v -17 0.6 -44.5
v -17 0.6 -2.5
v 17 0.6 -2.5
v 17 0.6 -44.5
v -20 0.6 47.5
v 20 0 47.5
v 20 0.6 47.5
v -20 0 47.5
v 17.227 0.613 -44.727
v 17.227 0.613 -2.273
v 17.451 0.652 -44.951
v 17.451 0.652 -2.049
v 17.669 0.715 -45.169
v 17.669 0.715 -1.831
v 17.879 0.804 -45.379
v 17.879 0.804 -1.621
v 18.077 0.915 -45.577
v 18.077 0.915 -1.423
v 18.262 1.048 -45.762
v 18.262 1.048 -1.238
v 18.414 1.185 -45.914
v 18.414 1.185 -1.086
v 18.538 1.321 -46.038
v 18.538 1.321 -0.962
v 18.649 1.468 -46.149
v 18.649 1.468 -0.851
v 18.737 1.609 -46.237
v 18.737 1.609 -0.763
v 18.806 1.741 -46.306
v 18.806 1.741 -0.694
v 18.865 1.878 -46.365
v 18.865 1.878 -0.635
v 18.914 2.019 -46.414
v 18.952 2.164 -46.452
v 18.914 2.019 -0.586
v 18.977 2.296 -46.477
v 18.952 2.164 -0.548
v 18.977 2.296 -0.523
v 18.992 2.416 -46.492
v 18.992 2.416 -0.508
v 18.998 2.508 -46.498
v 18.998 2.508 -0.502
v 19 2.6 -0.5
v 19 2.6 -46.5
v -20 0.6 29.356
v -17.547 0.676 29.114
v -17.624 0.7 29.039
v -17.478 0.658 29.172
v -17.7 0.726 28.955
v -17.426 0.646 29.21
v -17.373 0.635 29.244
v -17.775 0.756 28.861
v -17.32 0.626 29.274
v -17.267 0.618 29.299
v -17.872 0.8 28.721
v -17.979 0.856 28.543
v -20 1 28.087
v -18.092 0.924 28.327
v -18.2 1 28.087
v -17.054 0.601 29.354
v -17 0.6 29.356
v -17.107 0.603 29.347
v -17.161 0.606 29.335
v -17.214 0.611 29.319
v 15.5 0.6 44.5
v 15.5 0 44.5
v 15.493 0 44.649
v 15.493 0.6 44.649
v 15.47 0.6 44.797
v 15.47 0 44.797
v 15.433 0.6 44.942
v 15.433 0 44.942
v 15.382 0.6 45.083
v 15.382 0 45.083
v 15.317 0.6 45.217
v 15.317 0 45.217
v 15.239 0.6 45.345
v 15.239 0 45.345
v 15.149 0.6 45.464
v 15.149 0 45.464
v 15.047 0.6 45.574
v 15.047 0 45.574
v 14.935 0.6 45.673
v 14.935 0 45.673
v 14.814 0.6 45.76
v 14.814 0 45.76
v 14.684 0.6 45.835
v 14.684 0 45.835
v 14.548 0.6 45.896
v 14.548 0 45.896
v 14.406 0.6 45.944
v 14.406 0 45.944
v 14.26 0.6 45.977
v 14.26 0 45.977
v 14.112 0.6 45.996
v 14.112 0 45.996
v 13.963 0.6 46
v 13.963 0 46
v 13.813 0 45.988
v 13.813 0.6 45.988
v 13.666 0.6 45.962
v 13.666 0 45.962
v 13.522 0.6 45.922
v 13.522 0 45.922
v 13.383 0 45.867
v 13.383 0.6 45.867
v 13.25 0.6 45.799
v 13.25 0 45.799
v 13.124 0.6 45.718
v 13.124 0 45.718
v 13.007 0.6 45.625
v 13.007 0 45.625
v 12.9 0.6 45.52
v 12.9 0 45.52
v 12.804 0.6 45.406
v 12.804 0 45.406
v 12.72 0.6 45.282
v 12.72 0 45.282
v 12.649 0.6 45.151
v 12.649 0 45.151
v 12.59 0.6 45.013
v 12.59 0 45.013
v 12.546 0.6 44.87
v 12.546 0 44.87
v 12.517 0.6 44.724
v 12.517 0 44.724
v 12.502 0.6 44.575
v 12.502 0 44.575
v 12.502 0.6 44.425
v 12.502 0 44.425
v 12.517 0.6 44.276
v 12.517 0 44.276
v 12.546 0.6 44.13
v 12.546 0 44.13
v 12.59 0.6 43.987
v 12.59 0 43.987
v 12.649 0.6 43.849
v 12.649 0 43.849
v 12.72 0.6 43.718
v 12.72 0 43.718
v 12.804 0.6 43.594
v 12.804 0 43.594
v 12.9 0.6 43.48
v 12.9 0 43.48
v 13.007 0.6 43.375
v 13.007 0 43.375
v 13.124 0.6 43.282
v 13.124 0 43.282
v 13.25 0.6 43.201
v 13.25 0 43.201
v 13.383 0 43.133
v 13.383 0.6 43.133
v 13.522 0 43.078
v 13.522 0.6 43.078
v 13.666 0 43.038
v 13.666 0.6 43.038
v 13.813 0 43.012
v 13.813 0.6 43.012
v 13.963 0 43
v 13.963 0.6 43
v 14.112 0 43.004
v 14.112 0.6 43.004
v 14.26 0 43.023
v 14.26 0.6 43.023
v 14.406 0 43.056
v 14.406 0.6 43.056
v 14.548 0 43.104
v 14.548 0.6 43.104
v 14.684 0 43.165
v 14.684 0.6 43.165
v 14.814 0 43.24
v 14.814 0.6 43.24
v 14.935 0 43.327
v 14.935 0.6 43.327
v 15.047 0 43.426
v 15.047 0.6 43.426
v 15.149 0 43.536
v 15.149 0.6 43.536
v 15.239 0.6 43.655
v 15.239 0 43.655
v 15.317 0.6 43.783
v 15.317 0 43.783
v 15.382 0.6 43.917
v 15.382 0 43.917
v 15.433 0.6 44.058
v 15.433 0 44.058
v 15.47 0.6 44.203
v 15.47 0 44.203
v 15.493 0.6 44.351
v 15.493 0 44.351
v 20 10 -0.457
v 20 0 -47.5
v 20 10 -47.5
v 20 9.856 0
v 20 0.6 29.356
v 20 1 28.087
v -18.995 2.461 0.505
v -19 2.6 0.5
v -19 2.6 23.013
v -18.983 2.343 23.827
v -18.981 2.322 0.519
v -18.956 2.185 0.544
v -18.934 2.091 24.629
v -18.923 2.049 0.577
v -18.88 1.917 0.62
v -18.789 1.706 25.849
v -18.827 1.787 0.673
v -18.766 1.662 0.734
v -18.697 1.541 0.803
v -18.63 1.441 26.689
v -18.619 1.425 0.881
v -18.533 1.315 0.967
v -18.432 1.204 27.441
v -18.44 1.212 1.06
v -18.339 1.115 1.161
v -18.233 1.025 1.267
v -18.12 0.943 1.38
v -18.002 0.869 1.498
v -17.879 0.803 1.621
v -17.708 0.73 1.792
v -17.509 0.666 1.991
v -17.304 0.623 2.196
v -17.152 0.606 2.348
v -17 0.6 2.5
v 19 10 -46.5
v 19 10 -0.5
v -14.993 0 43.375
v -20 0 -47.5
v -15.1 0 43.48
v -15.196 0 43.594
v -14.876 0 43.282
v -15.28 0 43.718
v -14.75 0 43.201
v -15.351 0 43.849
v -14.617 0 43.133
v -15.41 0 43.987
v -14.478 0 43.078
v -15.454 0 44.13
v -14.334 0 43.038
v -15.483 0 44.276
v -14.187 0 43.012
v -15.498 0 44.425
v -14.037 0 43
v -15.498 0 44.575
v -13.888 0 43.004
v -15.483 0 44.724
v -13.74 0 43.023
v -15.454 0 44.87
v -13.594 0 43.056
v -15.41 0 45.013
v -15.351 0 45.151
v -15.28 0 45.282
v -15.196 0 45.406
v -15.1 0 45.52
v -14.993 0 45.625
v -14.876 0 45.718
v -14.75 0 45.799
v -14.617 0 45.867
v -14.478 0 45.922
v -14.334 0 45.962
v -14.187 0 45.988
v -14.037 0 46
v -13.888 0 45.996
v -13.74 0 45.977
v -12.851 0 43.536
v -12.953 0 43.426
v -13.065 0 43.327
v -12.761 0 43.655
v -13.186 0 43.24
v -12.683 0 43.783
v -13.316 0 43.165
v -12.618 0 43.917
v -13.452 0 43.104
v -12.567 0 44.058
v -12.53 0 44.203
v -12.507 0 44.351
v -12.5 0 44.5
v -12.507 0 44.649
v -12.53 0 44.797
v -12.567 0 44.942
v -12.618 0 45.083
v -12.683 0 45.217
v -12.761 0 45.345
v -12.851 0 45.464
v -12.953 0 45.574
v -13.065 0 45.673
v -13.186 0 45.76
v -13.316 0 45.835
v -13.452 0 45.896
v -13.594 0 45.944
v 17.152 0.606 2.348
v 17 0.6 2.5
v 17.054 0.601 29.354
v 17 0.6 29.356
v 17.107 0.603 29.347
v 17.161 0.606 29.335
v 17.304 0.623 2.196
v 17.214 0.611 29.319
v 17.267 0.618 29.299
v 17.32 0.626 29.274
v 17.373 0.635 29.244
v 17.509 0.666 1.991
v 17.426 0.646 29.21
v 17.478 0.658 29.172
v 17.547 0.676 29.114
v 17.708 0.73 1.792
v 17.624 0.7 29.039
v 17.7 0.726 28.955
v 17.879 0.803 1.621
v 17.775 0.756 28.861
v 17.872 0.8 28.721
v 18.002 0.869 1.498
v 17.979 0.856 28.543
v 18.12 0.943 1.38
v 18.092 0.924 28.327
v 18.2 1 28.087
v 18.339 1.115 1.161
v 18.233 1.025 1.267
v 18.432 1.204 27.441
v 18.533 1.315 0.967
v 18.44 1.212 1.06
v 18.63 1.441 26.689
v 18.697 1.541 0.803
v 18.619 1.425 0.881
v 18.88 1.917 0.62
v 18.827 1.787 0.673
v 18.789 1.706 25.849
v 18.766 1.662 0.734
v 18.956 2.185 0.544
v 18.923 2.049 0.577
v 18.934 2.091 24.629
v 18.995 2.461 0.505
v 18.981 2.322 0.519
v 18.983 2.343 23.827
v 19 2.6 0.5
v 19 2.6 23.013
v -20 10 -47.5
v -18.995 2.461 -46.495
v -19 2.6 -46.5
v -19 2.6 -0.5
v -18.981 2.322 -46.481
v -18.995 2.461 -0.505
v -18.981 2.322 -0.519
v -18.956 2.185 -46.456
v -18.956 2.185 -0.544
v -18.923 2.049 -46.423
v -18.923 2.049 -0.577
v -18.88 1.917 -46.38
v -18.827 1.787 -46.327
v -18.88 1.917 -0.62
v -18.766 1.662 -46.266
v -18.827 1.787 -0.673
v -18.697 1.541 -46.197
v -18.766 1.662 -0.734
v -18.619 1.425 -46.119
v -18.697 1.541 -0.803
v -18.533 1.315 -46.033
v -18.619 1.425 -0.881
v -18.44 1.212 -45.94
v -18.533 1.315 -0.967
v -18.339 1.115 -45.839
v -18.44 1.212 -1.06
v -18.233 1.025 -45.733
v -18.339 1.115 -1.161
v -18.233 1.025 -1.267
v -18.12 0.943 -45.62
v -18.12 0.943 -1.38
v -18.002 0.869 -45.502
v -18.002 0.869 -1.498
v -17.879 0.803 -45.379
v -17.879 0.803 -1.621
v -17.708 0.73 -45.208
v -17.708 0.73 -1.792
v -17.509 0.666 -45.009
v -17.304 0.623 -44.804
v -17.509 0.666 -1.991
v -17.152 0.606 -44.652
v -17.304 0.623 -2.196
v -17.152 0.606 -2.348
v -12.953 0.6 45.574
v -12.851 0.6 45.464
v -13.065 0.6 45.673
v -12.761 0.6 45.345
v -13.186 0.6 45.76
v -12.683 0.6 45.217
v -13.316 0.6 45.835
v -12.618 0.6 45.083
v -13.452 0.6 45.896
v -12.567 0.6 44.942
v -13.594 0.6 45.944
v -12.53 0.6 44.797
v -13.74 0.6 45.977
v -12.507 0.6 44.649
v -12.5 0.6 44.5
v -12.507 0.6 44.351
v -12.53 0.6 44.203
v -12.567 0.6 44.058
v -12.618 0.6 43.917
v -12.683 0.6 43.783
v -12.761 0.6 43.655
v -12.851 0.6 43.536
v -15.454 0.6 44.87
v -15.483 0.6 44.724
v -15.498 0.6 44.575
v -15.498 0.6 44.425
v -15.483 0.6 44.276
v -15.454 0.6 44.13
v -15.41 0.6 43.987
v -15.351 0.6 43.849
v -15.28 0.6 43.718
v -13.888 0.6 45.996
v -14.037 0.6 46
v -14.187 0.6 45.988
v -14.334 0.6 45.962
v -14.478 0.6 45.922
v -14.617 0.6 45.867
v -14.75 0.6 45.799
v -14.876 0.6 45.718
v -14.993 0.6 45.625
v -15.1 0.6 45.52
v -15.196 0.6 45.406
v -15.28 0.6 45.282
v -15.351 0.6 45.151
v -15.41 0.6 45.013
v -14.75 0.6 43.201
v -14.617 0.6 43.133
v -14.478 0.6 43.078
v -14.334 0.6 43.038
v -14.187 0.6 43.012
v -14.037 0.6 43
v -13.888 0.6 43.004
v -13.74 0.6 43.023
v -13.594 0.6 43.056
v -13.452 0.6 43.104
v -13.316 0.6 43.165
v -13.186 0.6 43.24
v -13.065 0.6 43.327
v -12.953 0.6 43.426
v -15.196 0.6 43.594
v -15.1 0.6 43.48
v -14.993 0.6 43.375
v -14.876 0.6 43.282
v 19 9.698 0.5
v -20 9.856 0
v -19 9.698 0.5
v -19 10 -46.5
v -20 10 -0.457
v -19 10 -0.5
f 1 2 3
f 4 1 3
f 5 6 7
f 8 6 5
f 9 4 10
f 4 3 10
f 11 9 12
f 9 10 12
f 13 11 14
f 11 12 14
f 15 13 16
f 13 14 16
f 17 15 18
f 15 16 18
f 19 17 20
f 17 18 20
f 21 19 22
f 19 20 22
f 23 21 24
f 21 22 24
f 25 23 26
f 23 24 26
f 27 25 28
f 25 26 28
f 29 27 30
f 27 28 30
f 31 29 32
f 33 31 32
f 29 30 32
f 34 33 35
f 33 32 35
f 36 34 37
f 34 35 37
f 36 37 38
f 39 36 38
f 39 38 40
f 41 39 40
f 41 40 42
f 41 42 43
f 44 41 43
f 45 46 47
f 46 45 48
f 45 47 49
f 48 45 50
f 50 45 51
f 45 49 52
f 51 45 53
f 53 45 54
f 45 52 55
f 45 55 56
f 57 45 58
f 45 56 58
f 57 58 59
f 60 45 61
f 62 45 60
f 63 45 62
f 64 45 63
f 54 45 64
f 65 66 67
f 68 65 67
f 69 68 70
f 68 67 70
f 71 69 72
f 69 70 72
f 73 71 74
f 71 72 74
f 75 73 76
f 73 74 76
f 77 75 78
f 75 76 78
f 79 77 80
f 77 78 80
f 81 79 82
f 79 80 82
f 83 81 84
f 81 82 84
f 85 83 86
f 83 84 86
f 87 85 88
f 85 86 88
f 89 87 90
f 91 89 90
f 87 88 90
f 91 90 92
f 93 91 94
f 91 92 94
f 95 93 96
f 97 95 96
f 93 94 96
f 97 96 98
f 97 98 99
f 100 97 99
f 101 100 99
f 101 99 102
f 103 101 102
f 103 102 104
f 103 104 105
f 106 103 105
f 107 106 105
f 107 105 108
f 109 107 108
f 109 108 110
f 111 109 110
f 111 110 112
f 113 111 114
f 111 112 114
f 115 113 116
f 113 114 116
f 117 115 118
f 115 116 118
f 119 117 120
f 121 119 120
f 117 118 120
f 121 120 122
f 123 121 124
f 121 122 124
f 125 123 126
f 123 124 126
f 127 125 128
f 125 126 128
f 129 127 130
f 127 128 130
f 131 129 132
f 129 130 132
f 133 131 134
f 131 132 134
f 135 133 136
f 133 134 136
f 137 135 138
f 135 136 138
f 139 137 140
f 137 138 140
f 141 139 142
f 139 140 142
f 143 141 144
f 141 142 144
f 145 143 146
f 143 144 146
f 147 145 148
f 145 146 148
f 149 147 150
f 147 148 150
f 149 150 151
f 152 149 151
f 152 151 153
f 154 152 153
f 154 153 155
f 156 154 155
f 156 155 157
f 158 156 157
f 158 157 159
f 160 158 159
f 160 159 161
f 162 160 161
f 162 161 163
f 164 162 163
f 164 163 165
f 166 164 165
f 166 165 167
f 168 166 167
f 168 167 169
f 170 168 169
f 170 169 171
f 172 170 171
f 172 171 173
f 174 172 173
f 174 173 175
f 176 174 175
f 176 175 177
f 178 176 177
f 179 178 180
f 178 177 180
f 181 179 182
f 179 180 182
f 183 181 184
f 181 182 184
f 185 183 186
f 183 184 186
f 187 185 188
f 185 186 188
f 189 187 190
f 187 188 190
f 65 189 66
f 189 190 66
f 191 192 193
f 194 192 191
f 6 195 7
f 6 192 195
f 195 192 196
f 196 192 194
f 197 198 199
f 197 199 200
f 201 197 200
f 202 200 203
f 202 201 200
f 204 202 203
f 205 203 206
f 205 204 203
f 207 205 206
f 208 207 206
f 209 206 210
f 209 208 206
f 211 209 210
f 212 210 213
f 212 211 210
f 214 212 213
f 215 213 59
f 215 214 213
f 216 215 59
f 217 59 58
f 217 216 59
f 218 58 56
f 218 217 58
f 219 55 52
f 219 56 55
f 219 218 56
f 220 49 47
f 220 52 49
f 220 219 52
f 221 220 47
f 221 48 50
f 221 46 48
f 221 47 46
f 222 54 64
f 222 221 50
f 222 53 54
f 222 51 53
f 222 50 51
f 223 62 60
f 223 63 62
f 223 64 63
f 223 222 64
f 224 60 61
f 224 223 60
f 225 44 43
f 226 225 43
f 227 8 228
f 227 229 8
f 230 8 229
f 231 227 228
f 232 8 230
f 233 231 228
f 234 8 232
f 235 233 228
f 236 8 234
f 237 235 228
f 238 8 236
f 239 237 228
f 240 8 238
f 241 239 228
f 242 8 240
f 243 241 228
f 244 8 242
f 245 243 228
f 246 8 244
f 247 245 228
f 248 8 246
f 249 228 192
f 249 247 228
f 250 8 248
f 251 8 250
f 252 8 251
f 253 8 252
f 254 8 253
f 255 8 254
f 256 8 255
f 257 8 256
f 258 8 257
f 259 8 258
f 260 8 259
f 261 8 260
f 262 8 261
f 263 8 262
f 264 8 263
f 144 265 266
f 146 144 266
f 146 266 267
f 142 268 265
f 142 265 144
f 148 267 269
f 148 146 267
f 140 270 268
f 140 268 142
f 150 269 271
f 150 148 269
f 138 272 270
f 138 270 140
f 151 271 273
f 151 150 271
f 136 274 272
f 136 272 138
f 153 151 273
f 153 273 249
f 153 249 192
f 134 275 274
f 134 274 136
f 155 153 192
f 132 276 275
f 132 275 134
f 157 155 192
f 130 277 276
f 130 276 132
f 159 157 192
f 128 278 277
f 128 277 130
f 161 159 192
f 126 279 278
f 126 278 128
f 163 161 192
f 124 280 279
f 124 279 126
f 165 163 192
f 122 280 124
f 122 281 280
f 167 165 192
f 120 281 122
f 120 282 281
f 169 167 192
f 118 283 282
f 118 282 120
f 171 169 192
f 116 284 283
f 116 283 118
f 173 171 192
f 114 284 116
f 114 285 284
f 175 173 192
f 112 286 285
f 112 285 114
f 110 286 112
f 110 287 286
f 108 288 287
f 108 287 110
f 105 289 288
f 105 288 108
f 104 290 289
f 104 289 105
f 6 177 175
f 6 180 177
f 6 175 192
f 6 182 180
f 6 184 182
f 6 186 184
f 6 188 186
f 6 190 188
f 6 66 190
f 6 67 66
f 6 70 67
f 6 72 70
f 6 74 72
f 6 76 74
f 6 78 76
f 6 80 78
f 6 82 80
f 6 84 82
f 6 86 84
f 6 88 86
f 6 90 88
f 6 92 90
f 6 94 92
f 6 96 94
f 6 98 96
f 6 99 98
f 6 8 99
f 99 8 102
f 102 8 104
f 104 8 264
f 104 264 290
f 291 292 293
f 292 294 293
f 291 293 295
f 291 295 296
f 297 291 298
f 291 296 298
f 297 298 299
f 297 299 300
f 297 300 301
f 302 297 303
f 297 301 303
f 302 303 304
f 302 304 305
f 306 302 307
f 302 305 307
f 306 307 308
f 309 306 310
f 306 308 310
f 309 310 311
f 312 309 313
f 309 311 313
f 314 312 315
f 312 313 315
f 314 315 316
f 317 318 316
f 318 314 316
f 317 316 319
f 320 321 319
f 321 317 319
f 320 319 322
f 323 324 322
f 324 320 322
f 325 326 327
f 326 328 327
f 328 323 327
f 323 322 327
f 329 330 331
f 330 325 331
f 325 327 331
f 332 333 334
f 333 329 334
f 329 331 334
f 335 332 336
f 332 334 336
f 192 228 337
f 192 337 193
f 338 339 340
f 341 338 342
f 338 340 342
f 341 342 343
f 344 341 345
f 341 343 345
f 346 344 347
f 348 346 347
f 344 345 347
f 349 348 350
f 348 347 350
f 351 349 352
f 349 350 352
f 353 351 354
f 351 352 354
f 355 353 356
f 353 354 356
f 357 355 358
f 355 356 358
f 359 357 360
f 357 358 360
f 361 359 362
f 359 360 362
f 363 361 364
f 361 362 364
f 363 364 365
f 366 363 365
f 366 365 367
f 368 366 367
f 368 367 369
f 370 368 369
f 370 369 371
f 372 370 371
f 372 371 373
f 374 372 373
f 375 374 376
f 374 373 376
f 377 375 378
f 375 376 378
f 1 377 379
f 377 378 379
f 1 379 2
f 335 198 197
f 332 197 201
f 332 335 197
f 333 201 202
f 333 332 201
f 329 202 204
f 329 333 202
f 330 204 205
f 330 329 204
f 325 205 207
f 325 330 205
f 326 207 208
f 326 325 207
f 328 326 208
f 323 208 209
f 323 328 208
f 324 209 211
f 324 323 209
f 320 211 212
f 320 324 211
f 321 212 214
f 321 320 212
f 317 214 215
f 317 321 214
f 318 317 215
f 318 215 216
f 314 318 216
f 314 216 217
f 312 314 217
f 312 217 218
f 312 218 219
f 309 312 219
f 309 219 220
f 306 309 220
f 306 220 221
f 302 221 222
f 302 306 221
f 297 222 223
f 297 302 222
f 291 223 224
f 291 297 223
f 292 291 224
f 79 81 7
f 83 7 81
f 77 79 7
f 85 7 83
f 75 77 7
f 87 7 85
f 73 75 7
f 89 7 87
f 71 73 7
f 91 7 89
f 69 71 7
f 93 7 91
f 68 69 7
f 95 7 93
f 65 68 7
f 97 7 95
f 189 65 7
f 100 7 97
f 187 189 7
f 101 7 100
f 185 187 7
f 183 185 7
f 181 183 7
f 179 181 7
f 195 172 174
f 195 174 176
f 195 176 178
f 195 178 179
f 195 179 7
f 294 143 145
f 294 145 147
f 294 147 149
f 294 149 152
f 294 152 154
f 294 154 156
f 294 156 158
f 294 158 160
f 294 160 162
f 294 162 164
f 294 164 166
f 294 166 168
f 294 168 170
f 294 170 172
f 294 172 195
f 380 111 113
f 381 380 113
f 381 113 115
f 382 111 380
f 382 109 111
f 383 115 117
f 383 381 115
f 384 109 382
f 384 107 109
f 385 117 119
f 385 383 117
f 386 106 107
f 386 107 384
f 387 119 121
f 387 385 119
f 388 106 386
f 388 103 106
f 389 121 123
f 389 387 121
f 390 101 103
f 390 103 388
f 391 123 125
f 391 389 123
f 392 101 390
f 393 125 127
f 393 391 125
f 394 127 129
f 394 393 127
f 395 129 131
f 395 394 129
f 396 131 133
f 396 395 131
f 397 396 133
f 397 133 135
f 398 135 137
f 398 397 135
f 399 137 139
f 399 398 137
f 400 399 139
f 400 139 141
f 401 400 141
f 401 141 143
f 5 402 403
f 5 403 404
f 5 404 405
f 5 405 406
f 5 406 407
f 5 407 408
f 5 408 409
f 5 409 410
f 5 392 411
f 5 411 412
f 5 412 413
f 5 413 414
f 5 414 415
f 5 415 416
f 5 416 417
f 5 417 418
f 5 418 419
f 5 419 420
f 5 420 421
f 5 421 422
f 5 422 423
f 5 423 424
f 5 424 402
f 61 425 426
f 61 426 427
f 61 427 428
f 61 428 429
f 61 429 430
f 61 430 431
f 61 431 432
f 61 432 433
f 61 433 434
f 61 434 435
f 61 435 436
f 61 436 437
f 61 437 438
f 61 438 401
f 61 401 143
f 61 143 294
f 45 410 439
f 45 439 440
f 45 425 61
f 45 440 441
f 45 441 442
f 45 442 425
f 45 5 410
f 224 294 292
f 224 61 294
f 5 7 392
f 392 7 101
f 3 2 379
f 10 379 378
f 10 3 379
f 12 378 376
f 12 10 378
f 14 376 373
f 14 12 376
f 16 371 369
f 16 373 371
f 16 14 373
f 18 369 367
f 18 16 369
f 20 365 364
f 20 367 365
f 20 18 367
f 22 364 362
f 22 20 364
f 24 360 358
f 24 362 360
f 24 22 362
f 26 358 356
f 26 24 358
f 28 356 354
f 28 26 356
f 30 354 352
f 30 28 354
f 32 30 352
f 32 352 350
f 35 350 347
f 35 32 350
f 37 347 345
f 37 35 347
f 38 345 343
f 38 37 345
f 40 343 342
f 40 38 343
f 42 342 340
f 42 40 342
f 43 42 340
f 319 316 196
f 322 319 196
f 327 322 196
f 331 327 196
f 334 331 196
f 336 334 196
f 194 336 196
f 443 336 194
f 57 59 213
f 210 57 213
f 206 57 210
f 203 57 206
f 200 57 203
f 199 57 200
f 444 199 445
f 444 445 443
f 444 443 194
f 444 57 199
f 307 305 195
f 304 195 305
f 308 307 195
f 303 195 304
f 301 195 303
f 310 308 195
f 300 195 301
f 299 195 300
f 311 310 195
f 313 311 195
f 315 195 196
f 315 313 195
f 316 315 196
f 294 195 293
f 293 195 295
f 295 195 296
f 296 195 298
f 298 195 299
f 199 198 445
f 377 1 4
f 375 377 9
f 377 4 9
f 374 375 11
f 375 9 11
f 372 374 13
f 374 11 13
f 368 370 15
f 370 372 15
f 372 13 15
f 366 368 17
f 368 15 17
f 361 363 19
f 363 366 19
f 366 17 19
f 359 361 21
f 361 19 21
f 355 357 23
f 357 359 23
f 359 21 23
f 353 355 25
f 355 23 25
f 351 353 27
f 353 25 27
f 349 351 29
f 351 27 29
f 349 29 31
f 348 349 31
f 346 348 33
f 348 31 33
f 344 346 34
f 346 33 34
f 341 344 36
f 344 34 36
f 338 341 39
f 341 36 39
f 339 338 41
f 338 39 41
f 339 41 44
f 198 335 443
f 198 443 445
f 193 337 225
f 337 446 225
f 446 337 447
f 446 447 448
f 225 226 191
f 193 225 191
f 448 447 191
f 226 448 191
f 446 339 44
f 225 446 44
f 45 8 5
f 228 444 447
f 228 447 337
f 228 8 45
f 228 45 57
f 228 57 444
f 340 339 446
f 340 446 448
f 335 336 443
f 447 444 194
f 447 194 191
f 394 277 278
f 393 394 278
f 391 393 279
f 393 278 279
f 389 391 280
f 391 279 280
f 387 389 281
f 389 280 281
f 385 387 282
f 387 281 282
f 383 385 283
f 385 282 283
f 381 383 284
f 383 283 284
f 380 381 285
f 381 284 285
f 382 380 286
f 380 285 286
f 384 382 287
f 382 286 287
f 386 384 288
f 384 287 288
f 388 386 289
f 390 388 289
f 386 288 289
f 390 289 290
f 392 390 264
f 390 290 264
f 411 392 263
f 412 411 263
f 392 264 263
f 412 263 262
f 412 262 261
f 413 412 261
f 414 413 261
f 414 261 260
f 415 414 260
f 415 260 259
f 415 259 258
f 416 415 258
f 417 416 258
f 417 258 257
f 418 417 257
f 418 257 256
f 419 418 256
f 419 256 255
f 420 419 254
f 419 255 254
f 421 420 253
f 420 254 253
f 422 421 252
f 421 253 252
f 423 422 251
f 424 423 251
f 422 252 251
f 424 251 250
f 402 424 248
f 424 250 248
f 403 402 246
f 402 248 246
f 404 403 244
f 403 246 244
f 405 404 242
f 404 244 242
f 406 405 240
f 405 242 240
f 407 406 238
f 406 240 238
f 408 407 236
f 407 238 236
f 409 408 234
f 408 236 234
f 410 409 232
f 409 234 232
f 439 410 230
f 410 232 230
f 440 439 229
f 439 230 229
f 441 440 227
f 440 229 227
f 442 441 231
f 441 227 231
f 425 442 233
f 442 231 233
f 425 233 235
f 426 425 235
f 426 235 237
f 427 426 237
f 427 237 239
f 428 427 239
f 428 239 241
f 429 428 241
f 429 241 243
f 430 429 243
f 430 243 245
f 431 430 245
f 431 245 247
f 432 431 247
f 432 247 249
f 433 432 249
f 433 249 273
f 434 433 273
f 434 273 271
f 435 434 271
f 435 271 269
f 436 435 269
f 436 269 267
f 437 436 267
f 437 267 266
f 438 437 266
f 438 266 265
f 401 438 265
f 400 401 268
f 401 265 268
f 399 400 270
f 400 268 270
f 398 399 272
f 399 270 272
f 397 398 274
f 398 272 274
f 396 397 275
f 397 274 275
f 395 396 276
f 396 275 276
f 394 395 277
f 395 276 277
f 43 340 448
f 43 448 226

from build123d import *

# Parameters (mm, degrees)
F0_W          = 38
F0_H          = 46
F2_DEPTH      = 10
F0_R          = 1.5
F3_DEPTH      = 0.6
F4_R          = 2
F5_DEPTH      = 25
F5_DEPTH_BACK = 25


with BuildPart() as f2:
    # F0 (on Front) → F2 (new body)
    with BuildSketch(Plane.XZ):
        Polygon((19, -47.5), (20, -47.5), (20, 47.5), (19, 47.5), (19, 44.5), (19, 0.5), (-19, 0.5), (-19, 47.5), (-20, 47.5), (-20, -47.5), align=None)
        with Locations((0, -23.5)):
            Rectangle(F0_W, F0_H, mode=Mode.SUBTRACT)
    extrude(amount=-F2_DEPTH)

    # F0 (on Front) → F3 (join)
    with BuildSketch(Plane.XZ):
        Polygon((19, 44.5), (19, 47.5), (-19, 47.5), (-19, 0.5), (19, 0.5), align=None)
        with Locations((-14, 44.5)):
            Circle(F0_R, mode=Mode.SUBTRACT)
        with Locations((14, 44.5)):
            Circle(F0_R, mode=Mode.SUBTRACT)
        with Locations((0, -23.5)):
            Rectangle(F0_W, F0_H)
    extrude(amount=-F3_DEPTH)

    # F4
    f4_edges = [f2.edges().sort_by_distance(p)[0] for p in [
        (-19, 0.6, 24),
        (0, 0.6, 0.5),
        (19, 0.6, 24),
        (-19, 0.6, -23.5),
        (0, 0.6, -0.5),
        (19, 0.6, -23.5),
        (0, 0.6, -46.5),
    ]]
    fillet(f4_edges, radius=F4_R)

    # F1 (on Right) → F5 (cut, two sides)
    with BuildSketch(Plane.YZ) as f5_sk:
        Polygon((10, -0.4571680084), (10, 31.2587800152), (10, 64.4635409117), (1, 64.4635409117), (0.6, 64.4635409117), (0.6, 29.3558231338), (1, 28.0871852128), (9.8558554806, 0), align=None)
    extrude(amount=-F5_DEPTH, mode=Mode.SUBTRACT)
    extrude(f5_sk.sketch, amount=F5_DEPTH_BACK, mode=Mode.SUBTRACT)


solid = f2.part
